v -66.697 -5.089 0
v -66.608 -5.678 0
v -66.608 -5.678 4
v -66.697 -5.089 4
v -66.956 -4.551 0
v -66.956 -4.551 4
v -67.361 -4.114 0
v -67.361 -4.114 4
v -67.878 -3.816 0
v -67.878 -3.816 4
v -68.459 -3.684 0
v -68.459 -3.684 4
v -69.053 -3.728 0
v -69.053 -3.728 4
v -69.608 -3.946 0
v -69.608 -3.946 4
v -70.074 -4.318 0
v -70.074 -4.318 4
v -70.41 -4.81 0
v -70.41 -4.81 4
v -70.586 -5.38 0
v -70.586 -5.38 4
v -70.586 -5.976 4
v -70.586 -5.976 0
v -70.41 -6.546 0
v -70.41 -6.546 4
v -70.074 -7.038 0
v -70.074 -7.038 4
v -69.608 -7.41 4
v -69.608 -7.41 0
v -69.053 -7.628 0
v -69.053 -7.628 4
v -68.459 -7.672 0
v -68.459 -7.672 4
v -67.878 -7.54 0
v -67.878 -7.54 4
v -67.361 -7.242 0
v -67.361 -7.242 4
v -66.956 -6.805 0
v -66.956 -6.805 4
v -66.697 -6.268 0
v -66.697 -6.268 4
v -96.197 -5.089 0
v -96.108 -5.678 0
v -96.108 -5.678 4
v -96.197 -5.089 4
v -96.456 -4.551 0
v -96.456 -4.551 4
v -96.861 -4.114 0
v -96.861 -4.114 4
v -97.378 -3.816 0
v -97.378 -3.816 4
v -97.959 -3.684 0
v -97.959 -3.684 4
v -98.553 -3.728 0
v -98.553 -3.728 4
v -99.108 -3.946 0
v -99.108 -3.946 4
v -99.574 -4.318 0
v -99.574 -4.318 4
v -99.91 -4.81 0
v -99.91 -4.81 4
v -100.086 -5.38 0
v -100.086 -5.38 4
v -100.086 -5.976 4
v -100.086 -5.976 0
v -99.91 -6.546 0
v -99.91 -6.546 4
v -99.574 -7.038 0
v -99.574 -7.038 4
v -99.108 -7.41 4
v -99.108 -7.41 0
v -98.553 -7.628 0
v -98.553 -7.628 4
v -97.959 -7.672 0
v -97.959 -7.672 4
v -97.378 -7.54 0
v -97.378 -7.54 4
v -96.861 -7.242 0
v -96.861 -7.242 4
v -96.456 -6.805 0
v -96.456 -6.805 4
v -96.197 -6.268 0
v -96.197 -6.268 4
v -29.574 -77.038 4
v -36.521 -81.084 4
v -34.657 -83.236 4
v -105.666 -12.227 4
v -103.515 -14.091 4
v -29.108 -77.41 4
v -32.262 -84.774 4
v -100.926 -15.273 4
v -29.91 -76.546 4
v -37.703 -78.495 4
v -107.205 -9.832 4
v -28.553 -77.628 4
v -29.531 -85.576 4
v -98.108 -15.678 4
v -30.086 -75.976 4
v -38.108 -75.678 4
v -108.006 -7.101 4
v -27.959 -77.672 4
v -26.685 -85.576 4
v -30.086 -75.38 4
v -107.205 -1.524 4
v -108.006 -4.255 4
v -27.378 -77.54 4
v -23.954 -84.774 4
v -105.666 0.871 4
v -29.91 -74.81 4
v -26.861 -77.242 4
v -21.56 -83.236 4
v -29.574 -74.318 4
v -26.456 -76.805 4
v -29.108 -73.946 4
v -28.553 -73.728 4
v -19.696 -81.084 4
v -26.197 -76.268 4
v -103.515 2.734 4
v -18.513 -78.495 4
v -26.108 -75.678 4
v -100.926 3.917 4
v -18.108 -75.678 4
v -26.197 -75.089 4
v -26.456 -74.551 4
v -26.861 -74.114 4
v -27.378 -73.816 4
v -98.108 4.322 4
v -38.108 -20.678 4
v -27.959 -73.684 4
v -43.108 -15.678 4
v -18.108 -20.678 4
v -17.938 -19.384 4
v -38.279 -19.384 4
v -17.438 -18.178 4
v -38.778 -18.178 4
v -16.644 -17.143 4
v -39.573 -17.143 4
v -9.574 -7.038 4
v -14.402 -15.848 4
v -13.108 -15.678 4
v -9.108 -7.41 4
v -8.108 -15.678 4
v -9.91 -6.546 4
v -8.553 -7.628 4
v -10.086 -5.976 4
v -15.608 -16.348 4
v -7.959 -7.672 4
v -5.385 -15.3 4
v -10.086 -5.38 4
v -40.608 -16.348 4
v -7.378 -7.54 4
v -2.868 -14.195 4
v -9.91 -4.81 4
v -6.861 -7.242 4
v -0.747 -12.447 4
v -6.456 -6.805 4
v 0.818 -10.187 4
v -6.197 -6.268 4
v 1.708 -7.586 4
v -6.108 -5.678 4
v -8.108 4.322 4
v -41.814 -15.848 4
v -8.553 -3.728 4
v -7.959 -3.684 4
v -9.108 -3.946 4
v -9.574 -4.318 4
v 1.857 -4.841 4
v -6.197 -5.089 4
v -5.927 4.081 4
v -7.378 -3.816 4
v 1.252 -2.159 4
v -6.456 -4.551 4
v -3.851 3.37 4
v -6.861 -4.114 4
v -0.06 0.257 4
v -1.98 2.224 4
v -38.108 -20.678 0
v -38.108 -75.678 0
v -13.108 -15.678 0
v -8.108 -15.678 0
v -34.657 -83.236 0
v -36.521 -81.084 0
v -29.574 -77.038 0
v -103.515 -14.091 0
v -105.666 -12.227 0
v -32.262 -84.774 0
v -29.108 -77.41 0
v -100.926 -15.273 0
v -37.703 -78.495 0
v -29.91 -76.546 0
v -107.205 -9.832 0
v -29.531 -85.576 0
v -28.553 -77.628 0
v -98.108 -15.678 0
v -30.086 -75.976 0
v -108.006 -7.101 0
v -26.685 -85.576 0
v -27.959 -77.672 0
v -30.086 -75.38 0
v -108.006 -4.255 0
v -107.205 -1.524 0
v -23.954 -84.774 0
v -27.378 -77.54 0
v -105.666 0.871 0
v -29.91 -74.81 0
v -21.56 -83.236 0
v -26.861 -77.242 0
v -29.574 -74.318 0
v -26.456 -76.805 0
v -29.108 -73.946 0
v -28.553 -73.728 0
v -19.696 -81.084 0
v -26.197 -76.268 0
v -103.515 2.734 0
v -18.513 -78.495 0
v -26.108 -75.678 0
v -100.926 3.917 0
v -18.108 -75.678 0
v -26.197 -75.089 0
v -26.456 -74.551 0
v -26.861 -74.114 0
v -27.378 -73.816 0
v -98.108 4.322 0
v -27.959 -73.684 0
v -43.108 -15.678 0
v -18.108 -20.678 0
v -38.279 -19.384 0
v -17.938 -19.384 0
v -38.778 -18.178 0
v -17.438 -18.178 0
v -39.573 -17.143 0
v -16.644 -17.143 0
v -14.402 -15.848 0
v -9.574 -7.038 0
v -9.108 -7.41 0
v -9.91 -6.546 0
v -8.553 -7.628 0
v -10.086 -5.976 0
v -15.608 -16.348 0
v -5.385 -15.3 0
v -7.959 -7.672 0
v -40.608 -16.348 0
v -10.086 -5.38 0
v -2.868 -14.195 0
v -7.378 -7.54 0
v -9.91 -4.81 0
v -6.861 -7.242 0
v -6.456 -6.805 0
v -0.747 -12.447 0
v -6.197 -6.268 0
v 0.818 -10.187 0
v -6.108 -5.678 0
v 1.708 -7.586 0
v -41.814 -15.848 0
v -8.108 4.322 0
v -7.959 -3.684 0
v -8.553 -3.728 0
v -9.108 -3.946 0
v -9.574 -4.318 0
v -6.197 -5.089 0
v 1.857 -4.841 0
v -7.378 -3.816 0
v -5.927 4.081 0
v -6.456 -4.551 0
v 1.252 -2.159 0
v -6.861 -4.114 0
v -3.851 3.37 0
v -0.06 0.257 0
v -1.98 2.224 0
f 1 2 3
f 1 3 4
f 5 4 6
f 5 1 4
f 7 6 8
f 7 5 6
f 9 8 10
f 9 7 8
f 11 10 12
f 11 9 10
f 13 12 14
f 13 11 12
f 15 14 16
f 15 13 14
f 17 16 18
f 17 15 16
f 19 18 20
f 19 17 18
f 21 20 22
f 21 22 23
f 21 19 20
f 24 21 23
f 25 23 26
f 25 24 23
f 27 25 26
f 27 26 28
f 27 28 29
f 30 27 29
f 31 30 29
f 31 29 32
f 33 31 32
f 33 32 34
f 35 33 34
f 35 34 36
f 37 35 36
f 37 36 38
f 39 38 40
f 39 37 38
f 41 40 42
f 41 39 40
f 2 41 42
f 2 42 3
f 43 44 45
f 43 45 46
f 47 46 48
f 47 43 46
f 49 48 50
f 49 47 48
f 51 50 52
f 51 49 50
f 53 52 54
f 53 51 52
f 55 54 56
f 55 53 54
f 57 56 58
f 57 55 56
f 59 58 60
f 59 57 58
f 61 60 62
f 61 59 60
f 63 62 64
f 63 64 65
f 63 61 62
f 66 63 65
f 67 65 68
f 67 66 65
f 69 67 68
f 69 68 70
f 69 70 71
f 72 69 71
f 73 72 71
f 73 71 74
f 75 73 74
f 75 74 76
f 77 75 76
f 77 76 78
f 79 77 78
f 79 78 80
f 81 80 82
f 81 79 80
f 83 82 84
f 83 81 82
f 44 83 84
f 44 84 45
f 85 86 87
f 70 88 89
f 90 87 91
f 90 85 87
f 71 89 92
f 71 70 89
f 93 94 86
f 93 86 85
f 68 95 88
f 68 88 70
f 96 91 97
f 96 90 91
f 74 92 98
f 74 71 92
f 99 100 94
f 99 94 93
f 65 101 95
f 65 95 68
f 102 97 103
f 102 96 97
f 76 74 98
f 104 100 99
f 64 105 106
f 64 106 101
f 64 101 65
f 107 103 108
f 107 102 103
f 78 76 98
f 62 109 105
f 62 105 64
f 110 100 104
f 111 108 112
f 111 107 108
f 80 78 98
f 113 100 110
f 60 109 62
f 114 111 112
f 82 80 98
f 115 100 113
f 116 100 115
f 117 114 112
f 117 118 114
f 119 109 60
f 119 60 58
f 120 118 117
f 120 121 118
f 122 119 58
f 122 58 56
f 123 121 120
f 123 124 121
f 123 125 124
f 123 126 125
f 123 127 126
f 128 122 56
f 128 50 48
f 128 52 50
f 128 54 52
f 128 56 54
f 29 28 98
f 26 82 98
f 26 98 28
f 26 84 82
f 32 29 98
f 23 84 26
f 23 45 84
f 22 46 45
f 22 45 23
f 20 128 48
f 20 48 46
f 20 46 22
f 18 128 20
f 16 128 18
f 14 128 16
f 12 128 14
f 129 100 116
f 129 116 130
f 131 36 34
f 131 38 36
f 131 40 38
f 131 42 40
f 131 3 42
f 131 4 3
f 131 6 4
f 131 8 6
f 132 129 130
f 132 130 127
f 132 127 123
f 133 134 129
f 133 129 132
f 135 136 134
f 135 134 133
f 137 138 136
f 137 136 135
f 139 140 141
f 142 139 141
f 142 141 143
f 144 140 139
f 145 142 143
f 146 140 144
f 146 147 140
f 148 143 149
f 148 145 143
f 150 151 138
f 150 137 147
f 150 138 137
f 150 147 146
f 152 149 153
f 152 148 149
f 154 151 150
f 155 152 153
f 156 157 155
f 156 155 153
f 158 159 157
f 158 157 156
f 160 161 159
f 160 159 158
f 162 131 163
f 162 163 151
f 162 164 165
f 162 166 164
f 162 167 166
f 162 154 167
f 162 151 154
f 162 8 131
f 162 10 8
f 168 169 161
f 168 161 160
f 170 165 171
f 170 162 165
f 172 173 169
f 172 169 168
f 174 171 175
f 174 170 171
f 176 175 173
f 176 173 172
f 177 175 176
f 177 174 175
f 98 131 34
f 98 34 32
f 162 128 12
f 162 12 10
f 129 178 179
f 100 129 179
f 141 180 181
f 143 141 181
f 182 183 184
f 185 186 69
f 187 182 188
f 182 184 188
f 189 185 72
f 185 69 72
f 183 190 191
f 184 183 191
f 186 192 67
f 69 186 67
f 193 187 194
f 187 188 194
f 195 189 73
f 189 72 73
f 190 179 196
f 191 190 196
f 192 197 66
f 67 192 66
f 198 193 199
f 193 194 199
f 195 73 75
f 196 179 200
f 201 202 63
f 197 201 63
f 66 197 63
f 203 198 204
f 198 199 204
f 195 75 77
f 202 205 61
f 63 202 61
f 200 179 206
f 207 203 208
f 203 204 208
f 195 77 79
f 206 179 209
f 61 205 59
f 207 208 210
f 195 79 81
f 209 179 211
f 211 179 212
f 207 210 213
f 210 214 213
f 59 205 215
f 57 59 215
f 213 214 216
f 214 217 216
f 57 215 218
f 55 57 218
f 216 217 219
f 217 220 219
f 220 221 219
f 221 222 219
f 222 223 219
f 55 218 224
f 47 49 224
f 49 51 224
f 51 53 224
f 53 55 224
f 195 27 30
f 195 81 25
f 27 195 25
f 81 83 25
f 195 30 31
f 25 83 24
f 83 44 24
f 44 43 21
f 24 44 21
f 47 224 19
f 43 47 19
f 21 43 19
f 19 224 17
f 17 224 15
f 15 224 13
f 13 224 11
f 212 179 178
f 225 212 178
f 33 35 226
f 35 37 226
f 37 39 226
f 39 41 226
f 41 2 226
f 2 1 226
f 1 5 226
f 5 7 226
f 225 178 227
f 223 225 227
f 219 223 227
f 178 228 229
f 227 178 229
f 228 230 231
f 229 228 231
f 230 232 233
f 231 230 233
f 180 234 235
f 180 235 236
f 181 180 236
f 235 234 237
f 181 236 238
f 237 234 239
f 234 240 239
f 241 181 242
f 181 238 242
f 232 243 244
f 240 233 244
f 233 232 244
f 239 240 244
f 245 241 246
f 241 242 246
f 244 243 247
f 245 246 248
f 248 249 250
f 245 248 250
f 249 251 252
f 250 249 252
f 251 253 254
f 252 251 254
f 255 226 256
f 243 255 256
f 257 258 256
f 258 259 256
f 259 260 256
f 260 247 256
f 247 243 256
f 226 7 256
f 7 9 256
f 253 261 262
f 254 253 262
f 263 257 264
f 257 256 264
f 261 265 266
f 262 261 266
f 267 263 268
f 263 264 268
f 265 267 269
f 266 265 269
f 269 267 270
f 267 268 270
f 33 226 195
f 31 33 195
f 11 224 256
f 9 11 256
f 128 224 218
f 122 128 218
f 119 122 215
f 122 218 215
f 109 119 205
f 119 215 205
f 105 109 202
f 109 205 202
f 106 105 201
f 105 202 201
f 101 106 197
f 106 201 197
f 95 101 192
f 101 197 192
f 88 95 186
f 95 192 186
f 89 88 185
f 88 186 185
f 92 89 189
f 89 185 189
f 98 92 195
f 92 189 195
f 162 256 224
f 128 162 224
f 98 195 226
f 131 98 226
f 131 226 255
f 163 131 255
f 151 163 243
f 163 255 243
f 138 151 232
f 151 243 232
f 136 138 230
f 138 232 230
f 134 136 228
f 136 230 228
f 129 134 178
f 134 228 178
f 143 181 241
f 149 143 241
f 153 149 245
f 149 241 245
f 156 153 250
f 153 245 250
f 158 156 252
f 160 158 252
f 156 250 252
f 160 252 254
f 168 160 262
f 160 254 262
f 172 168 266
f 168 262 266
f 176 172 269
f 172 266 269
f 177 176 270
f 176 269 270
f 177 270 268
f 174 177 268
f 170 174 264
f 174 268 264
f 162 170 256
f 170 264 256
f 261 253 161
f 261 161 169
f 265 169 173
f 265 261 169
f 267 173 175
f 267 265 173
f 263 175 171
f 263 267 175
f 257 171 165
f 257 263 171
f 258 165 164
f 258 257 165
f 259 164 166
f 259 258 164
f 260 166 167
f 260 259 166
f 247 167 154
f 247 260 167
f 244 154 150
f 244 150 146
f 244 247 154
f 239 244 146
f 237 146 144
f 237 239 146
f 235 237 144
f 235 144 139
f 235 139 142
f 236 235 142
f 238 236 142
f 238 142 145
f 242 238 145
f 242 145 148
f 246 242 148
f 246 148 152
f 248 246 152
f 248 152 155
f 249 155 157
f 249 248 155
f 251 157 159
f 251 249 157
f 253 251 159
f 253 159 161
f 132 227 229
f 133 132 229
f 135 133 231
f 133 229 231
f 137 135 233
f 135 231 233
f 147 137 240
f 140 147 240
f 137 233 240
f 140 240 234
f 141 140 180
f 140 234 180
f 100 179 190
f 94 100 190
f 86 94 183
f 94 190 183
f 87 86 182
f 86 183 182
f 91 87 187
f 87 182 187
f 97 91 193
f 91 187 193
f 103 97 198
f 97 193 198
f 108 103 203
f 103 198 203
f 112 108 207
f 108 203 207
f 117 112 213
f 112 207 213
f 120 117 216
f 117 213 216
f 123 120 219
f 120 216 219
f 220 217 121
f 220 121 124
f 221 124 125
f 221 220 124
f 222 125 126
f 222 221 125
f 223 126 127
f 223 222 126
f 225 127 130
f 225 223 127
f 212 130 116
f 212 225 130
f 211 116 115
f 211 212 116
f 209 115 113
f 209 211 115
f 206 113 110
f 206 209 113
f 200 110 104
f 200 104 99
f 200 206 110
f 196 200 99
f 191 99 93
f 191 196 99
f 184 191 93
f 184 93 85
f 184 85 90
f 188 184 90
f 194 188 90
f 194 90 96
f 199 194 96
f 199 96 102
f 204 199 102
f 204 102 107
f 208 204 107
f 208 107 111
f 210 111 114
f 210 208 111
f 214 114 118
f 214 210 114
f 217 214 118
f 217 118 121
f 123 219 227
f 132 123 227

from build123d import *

# Parameters (mm, degrees)
SKETCH_1_R      = 2
EXTRUDE_1_DEPTH = 4


with BuildPart() as part:
    # 草图1 → 凸台-拉伸1 (new body)
    with BuildSketch(Plane.XY):
        with BuildLine():
            Line((-98.108217502, -15.678085124), (-43.108217502, -15.678085124))
            ThreePointArc((-43.108217502, -15.678085124), (-39.572683597, -17.142551218), (-38.108217502, -20.678085124))
            Line((-38.108217502, -20.678085124), (-38.108217502, -75.678085124))
            ThreePointArc((-38.108217502, -75.678085124), (-28.108217502, -85.678085124), (-18.108217502, -75.678085124))
            Line((-18.108217502, -75.678085124), (-18.108217502, -20.678085124))
            ThreePointArc((-18.108217502, -20.678085124), (-16.643751408, -17.142551218), (-13.108217502, -15.678085124))
            Line((-13.108217502, -15.678085124), (-8.108217502, -15.678085124))
            ThreePointArc((-8.108217502, -15.678085124), (1.352773969, -8.916856554), (-1.979819728, 2.223986801))
            ThreePointArc((-1.979819728, 2.223986801), (-4.869446073, 3.782906348), (-8.108217502, 4.321914876))
            Line((-8.108217502, 4.321914876), (-98.108217502, 4.321914876))
            ThreePointArc((-98.108217502, 4.321914876), (-108.108217502, -5.678085124), (-98.108217502, -15.678085124))
        make_face()
        with Locations((-28.108217502, -75.678085124)):
            Circle(SKETCH_1_R, mode=Mode.SUBTRACT)
        with Locations((-98.108217502, -5.678085124)):
            Circle(SKETCH_1_R, mode=Mode.SUBTRACT)
        with Locations((-68.608217502, -5.678085124)):
            Circle(SKETCH_1_R, mode=Mode.SUBTRACT)
        with Locations((-8.108217502, -5.678085124)):
            Circle(SKETCH_1_R, mode=Mode.SUBTRACT)
    extrude(amount=EXTRUDE_1_DEPTH)


solid = part.part
